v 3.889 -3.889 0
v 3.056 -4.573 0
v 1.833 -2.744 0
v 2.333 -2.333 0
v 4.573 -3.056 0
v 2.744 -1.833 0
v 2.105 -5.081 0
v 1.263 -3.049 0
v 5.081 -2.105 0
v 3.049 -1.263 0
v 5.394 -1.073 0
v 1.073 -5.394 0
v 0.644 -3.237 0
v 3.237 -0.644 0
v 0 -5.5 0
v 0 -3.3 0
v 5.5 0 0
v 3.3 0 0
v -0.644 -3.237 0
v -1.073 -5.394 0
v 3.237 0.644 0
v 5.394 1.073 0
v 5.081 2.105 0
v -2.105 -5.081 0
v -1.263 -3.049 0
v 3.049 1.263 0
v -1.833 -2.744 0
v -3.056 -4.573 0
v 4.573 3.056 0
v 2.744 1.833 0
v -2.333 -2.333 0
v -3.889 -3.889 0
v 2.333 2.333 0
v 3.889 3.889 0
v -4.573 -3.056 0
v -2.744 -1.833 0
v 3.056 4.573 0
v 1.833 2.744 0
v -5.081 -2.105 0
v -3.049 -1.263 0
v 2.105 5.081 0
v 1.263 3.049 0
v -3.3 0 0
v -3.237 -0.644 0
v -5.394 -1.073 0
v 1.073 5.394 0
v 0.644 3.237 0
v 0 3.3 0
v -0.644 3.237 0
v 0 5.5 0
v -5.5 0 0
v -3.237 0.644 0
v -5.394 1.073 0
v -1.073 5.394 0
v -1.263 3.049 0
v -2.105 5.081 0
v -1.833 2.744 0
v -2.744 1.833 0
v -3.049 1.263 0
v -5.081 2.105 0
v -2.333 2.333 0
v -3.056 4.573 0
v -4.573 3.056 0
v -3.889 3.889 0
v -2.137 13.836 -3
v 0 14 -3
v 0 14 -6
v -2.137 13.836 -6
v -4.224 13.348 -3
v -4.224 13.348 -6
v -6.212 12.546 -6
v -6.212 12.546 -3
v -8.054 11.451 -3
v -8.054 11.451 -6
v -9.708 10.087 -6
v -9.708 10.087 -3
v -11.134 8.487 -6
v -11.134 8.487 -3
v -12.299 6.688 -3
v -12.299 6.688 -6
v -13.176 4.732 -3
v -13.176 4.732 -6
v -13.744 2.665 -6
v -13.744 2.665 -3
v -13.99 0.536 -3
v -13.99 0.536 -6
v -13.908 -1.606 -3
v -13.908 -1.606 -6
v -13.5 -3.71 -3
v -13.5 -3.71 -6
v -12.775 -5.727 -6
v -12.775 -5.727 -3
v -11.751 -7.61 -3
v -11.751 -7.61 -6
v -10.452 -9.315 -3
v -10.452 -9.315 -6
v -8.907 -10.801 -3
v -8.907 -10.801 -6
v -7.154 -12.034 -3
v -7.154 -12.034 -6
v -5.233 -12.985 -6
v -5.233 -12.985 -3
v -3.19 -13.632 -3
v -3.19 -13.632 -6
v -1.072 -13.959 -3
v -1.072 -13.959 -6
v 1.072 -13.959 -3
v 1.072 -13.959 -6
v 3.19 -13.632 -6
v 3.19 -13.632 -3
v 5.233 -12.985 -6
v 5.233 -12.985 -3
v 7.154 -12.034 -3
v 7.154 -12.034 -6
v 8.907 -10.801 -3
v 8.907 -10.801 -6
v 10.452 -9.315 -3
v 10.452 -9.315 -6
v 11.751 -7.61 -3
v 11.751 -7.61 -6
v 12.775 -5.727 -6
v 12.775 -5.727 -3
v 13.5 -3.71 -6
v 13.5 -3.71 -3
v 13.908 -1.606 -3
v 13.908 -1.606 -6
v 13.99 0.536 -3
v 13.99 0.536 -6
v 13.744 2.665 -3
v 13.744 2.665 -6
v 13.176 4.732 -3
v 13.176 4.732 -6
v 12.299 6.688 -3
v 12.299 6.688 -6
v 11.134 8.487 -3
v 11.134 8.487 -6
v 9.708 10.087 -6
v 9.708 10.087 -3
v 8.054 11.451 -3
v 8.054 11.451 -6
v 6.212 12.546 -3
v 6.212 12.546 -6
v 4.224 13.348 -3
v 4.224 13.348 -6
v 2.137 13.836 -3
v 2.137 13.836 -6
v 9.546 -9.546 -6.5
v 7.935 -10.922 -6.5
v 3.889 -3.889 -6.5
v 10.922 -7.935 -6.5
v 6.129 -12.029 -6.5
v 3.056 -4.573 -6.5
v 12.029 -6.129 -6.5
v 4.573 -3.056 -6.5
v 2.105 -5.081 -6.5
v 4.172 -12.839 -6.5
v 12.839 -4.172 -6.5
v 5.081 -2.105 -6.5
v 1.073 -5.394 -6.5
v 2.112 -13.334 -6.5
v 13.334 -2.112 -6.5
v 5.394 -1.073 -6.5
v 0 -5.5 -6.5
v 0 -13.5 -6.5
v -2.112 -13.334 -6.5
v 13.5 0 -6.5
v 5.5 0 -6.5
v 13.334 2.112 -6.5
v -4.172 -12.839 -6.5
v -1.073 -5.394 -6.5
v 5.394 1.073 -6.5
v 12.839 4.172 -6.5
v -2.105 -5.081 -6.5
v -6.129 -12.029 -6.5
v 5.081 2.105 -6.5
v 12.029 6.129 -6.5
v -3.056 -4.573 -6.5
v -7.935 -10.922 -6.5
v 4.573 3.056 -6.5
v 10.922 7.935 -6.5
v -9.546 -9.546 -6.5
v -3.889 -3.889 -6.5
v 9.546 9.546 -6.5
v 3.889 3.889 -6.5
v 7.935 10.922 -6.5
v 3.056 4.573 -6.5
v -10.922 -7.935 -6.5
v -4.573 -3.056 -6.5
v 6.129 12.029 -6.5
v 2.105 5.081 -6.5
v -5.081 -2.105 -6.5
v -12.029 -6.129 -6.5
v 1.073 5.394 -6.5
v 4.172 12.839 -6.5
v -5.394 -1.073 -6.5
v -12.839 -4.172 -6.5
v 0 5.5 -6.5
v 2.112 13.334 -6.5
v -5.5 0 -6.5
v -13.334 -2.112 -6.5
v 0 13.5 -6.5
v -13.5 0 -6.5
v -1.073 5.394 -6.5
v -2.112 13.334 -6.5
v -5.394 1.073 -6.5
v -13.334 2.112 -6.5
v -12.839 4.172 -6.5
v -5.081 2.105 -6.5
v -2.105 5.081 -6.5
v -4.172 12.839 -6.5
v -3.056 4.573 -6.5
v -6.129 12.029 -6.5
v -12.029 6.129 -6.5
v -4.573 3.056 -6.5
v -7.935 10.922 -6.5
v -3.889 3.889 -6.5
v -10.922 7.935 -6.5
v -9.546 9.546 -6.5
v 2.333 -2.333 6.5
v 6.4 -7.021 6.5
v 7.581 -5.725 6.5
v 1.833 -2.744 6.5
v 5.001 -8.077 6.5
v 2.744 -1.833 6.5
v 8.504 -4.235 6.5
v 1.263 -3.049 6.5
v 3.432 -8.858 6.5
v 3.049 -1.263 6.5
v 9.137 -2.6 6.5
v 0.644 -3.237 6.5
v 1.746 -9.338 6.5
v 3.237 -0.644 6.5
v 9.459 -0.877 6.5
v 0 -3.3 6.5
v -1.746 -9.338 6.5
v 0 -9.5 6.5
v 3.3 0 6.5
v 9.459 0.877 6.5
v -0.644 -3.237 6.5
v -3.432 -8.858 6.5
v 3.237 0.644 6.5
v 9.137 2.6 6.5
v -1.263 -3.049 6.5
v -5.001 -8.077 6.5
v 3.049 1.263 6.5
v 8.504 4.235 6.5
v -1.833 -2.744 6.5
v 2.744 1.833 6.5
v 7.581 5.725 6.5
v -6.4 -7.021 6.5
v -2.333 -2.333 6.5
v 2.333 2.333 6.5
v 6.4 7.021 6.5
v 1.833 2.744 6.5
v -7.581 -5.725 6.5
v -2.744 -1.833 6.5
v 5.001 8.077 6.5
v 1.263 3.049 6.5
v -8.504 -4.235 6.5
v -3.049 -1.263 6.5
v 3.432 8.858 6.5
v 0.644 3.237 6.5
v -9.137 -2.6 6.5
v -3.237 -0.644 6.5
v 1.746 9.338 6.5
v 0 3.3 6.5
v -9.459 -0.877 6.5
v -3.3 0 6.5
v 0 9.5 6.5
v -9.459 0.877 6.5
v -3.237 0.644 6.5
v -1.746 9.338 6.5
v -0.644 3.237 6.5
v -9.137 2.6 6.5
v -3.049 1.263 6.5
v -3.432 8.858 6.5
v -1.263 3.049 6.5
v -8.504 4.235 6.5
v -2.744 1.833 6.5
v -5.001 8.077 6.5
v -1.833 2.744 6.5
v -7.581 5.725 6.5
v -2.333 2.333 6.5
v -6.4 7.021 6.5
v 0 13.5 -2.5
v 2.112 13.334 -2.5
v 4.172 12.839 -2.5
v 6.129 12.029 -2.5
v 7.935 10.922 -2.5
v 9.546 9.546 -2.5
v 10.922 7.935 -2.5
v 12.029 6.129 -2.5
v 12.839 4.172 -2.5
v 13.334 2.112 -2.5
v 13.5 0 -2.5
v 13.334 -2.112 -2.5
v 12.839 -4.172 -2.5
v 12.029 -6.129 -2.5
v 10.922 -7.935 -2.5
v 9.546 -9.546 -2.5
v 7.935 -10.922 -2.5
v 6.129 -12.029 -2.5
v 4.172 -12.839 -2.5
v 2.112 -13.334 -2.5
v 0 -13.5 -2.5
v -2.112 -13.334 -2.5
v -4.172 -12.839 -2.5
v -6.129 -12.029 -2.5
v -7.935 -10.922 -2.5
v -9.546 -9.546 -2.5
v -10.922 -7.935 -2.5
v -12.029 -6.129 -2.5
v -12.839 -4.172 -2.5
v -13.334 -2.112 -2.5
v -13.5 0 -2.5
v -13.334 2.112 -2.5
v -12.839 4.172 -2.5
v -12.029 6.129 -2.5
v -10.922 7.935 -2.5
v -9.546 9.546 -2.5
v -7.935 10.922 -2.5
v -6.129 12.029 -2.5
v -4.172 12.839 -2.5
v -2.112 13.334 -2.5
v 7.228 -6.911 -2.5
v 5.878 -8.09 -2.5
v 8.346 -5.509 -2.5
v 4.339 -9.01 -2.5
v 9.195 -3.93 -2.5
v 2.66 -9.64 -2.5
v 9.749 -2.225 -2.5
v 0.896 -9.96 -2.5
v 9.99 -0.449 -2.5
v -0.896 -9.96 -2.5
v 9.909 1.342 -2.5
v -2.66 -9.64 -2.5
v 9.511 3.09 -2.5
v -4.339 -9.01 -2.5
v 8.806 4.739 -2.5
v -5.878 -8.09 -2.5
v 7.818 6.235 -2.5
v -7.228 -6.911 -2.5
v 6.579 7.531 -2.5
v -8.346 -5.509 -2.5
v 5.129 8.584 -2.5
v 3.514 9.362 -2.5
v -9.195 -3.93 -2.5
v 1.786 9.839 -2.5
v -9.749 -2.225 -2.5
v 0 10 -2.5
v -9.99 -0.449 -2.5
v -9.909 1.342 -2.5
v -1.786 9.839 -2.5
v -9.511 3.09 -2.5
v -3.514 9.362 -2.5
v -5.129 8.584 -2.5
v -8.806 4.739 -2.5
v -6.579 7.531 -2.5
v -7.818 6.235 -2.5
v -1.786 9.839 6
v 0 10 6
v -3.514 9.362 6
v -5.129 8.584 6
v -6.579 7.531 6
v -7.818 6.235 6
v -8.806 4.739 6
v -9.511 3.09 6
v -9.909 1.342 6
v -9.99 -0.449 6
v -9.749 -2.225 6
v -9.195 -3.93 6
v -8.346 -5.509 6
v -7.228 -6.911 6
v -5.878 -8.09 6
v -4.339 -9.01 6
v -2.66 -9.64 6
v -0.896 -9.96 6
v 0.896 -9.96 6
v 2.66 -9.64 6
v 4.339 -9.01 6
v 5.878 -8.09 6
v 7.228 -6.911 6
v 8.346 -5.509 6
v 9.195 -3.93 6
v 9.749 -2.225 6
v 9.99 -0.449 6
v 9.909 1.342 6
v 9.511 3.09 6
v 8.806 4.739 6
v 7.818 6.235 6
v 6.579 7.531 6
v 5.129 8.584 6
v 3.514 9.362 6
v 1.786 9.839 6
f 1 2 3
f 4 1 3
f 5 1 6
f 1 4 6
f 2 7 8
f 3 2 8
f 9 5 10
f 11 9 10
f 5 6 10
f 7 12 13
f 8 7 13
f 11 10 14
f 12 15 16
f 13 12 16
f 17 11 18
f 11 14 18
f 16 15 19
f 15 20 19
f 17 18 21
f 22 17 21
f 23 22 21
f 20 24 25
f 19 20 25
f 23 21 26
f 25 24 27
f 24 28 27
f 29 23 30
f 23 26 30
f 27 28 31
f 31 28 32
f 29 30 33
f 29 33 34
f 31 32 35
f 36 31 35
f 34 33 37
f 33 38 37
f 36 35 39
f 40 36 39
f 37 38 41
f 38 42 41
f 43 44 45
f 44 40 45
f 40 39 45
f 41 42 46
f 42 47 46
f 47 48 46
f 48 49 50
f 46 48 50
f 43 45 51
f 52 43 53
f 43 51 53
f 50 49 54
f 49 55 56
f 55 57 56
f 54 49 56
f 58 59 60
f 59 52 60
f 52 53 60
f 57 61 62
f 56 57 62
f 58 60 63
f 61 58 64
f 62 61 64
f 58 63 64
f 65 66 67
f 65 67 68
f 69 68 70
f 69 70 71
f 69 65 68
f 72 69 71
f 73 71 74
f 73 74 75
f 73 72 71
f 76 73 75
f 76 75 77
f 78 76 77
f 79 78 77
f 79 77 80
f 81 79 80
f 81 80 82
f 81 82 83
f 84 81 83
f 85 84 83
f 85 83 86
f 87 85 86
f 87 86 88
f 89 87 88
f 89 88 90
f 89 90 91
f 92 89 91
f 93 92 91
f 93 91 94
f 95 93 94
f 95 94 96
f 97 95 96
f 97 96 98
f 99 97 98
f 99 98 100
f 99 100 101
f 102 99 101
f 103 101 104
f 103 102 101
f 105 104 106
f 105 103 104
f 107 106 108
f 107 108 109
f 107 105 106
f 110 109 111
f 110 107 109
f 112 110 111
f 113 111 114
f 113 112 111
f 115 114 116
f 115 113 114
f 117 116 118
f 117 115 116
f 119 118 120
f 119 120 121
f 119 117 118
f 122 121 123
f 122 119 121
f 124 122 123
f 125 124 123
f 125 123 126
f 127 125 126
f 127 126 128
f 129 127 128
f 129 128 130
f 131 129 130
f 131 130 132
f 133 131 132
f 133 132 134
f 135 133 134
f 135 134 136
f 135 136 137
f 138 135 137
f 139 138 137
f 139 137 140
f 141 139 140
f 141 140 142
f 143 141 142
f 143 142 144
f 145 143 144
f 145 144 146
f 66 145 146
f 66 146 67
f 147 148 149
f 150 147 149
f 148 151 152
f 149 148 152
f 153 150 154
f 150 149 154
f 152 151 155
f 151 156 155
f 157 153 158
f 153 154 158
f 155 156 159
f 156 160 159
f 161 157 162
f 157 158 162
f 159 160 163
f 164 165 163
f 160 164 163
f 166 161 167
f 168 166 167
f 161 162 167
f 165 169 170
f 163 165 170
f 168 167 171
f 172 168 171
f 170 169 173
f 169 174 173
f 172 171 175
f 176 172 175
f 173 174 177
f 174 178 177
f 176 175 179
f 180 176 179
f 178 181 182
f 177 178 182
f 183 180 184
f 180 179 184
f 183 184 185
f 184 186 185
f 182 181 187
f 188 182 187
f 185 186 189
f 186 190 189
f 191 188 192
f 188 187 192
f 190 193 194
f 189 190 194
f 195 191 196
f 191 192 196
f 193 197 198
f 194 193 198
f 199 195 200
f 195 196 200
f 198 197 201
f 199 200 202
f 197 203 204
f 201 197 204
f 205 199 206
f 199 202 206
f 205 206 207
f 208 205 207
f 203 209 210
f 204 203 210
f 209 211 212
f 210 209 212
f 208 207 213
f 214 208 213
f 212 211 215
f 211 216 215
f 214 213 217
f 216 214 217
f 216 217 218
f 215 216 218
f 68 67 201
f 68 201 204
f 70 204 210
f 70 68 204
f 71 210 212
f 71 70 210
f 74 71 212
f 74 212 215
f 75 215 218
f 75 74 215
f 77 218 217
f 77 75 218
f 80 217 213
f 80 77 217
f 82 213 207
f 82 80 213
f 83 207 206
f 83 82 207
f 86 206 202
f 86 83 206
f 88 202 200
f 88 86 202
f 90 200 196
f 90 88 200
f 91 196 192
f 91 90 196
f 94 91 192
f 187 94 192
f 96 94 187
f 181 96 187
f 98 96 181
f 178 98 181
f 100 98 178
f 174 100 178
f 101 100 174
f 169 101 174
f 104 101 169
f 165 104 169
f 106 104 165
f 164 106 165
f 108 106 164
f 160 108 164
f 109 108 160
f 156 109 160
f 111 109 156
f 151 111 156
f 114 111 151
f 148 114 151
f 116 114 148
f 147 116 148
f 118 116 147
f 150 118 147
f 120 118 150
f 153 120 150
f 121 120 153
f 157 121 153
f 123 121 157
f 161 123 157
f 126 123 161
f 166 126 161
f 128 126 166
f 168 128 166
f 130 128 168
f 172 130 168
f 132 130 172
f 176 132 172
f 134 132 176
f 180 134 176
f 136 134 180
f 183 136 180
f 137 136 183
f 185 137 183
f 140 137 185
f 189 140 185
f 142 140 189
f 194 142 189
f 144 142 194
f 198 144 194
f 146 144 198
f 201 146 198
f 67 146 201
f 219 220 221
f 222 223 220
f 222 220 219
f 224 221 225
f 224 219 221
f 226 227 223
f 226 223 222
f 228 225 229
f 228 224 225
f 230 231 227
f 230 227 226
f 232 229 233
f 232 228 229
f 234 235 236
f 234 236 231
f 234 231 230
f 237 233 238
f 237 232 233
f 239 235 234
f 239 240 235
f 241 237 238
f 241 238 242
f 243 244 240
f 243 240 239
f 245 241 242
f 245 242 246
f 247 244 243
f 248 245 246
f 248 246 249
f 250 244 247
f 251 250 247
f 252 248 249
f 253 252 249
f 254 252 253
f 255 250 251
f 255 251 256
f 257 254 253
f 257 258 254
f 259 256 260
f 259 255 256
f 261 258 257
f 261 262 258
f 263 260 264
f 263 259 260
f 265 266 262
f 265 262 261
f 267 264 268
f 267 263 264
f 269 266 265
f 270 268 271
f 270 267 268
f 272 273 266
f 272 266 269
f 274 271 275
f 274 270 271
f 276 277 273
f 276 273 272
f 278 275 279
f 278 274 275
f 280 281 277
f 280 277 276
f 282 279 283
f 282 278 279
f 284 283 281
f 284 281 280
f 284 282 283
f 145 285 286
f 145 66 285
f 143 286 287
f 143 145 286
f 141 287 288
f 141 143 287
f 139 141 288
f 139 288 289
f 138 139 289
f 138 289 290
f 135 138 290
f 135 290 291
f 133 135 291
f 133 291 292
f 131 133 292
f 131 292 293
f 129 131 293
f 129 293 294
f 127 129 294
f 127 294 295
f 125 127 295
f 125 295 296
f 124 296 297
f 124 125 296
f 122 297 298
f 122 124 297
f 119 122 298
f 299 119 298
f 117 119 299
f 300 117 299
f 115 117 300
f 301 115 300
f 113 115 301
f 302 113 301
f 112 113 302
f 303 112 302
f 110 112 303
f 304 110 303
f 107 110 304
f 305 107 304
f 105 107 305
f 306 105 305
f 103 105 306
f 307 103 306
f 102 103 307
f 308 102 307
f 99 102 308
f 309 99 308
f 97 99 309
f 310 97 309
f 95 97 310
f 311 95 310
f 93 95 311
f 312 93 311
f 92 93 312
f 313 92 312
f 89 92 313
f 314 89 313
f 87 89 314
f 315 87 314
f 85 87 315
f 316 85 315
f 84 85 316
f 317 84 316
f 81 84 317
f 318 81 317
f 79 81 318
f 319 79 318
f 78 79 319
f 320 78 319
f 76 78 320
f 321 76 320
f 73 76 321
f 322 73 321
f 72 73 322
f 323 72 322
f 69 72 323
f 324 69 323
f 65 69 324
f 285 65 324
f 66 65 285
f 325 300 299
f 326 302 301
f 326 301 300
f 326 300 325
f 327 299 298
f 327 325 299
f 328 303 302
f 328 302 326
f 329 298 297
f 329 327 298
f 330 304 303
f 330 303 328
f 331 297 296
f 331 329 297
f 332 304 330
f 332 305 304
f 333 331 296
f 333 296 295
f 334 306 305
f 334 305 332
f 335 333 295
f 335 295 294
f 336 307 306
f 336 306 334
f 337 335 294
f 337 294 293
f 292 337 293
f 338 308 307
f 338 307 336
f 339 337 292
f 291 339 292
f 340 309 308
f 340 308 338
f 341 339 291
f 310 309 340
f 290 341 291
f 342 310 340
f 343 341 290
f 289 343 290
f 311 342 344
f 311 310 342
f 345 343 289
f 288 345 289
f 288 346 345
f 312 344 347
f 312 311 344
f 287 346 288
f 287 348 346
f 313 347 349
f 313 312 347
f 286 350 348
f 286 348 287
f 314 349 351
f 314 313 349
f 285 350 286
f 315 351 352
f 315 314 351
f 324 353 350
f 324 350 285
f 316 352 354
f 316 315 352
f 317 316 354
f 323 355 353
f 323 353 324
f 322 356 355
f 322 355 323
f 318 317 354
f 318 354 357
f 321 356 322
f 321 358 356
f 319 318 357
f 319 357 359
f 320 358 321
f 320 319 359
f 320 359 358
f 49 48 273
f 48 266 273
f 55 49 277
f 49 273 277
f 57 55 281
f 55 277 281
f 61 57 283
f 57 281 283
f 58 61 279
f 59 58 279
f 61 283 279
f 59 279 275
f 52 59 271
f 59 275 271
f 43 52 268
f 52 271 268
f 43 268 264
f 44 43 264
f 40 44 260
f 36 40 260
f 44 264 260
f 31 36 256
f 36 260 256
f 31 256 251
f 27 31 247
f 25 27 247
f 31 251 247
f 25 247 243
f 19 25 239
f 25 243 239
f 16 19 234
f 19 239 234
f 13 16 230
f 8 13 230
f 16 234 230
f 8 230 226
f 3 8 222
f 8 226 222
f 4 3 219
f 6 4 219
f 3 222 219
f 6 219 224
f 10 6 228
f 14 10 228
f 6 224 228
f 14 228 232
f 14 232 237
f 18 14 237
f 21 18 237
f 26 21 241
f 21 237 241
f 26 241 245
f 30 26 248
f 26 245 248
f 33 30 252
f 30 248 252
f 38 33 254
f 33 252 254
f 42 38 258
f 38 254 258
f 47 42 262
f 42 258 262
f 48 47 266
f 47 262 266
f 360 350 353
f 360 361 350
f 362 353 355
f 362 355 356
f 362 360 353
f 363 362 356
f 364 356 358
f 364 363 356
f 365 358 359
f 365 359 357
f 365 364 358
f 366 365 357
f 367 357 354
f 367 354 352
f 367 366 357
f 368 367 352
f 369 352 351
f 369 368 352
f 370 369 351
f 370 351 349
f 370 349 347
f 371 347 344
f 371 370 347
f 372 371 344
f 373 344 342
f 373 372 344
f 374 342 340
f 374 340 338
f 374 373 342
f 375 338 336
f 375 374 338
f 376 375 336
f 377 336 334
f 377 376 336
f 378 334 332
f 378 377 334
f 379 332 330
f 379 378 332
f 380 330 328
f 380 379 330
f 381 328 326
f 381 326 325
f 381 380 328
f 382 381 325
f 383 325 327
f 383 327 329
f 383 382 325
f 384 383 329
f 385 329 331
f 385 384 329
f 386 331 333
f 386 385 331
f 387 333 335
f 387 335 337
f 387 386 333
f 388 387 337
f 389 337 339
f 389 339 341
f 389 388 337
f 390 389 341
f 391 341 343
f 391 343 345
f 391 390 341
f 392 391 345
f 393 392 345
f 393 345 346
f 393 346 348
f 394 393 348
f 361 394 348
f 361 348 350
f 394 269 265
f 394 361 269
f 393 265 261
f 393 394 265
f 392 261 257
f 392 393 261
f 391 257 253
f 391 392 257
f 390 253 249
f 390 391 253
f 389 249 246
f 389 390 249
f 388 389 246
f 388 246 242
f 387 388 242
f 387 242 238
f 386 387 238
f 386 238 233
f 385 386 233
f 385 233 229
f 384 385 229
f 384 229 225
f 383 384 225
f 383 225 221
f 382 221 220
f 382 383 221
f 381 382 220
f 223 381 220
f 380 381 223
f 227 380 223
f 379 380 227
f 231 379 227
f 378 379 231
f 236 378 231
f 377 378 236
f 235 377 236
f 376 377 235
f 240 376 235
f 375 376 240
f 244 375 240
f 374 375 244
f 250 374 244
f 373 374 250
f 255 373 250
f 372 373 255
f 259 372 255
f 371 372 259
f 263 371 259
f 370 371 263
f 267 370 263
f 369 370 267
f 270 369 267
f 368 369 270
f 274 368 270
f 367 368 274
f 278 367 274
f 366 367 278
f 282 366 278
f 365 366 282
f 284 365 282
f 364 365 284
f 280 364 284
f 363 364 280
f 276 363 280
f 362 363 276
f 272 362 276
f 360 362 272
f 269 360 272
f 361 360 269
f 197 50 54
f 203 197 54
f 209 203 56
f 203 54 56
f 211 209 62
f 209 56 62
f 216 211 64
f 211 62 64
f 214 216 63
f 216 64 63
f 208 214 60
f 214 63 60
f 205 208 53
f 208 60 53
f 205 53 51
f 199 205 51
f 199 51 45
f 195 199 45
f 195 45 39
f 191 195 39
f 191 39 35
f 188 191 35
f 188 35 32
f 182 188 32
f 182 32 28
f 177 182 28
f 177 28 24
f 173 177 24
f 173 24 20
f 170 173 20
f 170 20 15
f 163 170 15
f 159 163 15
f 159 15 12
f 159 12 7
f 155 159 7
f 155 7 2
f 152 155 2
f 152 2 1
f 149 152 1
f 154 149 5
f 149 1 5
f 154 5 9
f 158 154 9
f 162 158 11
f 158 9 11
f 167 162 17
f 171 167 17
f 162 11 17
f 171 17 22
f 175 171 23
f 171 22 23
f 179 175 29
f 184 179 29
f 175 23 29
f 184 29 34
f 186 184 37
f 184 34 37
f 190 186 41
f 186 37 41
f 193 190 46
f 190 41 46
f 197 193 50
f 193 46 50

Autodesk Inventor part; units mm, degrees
ref_plane "YZ Plane" through (0, 0, 0) normal (1, 0, 0) x (0, 1, 0)
ref_plane "XZ Plane" through (0, 0, 0) normal (0, 1, 0) x (-1, 0, 0)
ref_plane "XY Plane" through (0, 0, 0) normal (0, 0, 1) x (1, 0, 0)
sketch "Sketch11" plane through (0, 0, 0) normal (1, 0, 0) x (0, 1, 0)
  line L0 (0, -6.5) -> (0, 6.5)
  line L1 (0, -6.5) -> (14, -6.5)
  line L2 (14, -6.5) -> (14, -2.5)
  line L3 (14, -2.5) -> (10, -2.5)
  line L4 (10, -2.5) -> (10, 6.5)
  line L5 (10, 6.5) -> (0, 6.5)
  point P0 (0, 0)
  point P1 (0, 0)
  dimension "d50" = 20
  dimension "d51" = 28
  dimension "d52" = 4
  dimension "d53" = 13
revolve "Revolution1" add sketch "Sketch11" angle 360 about axis through (0, 0, -6.5) along (0, 0, 1)
sketch "Sketch12" plane through (0, 0, -6.5) normal (0, 0, -1) x (-1, 0, 0)
  circle A0 centre (0, 0) radius 14 projected
  point P0 (0, 0)
hole "Hole4" at (0, 0, -6.5) direction (0, 0, 1) diameter 6.6 end through all counterbore diameter 11 counterbore depth 6.5 clearance for "Socket Head Cap Screw" size "M6" standard "TS Profile"
chamfer "Chamfer1" distance 0.5 angle 45 3 edges at (0, -10, 6.5) (0, -14, -2.5) (0, -14, -6.5)
properties part number "TL20240701-10110CV-006" material "S45C"
